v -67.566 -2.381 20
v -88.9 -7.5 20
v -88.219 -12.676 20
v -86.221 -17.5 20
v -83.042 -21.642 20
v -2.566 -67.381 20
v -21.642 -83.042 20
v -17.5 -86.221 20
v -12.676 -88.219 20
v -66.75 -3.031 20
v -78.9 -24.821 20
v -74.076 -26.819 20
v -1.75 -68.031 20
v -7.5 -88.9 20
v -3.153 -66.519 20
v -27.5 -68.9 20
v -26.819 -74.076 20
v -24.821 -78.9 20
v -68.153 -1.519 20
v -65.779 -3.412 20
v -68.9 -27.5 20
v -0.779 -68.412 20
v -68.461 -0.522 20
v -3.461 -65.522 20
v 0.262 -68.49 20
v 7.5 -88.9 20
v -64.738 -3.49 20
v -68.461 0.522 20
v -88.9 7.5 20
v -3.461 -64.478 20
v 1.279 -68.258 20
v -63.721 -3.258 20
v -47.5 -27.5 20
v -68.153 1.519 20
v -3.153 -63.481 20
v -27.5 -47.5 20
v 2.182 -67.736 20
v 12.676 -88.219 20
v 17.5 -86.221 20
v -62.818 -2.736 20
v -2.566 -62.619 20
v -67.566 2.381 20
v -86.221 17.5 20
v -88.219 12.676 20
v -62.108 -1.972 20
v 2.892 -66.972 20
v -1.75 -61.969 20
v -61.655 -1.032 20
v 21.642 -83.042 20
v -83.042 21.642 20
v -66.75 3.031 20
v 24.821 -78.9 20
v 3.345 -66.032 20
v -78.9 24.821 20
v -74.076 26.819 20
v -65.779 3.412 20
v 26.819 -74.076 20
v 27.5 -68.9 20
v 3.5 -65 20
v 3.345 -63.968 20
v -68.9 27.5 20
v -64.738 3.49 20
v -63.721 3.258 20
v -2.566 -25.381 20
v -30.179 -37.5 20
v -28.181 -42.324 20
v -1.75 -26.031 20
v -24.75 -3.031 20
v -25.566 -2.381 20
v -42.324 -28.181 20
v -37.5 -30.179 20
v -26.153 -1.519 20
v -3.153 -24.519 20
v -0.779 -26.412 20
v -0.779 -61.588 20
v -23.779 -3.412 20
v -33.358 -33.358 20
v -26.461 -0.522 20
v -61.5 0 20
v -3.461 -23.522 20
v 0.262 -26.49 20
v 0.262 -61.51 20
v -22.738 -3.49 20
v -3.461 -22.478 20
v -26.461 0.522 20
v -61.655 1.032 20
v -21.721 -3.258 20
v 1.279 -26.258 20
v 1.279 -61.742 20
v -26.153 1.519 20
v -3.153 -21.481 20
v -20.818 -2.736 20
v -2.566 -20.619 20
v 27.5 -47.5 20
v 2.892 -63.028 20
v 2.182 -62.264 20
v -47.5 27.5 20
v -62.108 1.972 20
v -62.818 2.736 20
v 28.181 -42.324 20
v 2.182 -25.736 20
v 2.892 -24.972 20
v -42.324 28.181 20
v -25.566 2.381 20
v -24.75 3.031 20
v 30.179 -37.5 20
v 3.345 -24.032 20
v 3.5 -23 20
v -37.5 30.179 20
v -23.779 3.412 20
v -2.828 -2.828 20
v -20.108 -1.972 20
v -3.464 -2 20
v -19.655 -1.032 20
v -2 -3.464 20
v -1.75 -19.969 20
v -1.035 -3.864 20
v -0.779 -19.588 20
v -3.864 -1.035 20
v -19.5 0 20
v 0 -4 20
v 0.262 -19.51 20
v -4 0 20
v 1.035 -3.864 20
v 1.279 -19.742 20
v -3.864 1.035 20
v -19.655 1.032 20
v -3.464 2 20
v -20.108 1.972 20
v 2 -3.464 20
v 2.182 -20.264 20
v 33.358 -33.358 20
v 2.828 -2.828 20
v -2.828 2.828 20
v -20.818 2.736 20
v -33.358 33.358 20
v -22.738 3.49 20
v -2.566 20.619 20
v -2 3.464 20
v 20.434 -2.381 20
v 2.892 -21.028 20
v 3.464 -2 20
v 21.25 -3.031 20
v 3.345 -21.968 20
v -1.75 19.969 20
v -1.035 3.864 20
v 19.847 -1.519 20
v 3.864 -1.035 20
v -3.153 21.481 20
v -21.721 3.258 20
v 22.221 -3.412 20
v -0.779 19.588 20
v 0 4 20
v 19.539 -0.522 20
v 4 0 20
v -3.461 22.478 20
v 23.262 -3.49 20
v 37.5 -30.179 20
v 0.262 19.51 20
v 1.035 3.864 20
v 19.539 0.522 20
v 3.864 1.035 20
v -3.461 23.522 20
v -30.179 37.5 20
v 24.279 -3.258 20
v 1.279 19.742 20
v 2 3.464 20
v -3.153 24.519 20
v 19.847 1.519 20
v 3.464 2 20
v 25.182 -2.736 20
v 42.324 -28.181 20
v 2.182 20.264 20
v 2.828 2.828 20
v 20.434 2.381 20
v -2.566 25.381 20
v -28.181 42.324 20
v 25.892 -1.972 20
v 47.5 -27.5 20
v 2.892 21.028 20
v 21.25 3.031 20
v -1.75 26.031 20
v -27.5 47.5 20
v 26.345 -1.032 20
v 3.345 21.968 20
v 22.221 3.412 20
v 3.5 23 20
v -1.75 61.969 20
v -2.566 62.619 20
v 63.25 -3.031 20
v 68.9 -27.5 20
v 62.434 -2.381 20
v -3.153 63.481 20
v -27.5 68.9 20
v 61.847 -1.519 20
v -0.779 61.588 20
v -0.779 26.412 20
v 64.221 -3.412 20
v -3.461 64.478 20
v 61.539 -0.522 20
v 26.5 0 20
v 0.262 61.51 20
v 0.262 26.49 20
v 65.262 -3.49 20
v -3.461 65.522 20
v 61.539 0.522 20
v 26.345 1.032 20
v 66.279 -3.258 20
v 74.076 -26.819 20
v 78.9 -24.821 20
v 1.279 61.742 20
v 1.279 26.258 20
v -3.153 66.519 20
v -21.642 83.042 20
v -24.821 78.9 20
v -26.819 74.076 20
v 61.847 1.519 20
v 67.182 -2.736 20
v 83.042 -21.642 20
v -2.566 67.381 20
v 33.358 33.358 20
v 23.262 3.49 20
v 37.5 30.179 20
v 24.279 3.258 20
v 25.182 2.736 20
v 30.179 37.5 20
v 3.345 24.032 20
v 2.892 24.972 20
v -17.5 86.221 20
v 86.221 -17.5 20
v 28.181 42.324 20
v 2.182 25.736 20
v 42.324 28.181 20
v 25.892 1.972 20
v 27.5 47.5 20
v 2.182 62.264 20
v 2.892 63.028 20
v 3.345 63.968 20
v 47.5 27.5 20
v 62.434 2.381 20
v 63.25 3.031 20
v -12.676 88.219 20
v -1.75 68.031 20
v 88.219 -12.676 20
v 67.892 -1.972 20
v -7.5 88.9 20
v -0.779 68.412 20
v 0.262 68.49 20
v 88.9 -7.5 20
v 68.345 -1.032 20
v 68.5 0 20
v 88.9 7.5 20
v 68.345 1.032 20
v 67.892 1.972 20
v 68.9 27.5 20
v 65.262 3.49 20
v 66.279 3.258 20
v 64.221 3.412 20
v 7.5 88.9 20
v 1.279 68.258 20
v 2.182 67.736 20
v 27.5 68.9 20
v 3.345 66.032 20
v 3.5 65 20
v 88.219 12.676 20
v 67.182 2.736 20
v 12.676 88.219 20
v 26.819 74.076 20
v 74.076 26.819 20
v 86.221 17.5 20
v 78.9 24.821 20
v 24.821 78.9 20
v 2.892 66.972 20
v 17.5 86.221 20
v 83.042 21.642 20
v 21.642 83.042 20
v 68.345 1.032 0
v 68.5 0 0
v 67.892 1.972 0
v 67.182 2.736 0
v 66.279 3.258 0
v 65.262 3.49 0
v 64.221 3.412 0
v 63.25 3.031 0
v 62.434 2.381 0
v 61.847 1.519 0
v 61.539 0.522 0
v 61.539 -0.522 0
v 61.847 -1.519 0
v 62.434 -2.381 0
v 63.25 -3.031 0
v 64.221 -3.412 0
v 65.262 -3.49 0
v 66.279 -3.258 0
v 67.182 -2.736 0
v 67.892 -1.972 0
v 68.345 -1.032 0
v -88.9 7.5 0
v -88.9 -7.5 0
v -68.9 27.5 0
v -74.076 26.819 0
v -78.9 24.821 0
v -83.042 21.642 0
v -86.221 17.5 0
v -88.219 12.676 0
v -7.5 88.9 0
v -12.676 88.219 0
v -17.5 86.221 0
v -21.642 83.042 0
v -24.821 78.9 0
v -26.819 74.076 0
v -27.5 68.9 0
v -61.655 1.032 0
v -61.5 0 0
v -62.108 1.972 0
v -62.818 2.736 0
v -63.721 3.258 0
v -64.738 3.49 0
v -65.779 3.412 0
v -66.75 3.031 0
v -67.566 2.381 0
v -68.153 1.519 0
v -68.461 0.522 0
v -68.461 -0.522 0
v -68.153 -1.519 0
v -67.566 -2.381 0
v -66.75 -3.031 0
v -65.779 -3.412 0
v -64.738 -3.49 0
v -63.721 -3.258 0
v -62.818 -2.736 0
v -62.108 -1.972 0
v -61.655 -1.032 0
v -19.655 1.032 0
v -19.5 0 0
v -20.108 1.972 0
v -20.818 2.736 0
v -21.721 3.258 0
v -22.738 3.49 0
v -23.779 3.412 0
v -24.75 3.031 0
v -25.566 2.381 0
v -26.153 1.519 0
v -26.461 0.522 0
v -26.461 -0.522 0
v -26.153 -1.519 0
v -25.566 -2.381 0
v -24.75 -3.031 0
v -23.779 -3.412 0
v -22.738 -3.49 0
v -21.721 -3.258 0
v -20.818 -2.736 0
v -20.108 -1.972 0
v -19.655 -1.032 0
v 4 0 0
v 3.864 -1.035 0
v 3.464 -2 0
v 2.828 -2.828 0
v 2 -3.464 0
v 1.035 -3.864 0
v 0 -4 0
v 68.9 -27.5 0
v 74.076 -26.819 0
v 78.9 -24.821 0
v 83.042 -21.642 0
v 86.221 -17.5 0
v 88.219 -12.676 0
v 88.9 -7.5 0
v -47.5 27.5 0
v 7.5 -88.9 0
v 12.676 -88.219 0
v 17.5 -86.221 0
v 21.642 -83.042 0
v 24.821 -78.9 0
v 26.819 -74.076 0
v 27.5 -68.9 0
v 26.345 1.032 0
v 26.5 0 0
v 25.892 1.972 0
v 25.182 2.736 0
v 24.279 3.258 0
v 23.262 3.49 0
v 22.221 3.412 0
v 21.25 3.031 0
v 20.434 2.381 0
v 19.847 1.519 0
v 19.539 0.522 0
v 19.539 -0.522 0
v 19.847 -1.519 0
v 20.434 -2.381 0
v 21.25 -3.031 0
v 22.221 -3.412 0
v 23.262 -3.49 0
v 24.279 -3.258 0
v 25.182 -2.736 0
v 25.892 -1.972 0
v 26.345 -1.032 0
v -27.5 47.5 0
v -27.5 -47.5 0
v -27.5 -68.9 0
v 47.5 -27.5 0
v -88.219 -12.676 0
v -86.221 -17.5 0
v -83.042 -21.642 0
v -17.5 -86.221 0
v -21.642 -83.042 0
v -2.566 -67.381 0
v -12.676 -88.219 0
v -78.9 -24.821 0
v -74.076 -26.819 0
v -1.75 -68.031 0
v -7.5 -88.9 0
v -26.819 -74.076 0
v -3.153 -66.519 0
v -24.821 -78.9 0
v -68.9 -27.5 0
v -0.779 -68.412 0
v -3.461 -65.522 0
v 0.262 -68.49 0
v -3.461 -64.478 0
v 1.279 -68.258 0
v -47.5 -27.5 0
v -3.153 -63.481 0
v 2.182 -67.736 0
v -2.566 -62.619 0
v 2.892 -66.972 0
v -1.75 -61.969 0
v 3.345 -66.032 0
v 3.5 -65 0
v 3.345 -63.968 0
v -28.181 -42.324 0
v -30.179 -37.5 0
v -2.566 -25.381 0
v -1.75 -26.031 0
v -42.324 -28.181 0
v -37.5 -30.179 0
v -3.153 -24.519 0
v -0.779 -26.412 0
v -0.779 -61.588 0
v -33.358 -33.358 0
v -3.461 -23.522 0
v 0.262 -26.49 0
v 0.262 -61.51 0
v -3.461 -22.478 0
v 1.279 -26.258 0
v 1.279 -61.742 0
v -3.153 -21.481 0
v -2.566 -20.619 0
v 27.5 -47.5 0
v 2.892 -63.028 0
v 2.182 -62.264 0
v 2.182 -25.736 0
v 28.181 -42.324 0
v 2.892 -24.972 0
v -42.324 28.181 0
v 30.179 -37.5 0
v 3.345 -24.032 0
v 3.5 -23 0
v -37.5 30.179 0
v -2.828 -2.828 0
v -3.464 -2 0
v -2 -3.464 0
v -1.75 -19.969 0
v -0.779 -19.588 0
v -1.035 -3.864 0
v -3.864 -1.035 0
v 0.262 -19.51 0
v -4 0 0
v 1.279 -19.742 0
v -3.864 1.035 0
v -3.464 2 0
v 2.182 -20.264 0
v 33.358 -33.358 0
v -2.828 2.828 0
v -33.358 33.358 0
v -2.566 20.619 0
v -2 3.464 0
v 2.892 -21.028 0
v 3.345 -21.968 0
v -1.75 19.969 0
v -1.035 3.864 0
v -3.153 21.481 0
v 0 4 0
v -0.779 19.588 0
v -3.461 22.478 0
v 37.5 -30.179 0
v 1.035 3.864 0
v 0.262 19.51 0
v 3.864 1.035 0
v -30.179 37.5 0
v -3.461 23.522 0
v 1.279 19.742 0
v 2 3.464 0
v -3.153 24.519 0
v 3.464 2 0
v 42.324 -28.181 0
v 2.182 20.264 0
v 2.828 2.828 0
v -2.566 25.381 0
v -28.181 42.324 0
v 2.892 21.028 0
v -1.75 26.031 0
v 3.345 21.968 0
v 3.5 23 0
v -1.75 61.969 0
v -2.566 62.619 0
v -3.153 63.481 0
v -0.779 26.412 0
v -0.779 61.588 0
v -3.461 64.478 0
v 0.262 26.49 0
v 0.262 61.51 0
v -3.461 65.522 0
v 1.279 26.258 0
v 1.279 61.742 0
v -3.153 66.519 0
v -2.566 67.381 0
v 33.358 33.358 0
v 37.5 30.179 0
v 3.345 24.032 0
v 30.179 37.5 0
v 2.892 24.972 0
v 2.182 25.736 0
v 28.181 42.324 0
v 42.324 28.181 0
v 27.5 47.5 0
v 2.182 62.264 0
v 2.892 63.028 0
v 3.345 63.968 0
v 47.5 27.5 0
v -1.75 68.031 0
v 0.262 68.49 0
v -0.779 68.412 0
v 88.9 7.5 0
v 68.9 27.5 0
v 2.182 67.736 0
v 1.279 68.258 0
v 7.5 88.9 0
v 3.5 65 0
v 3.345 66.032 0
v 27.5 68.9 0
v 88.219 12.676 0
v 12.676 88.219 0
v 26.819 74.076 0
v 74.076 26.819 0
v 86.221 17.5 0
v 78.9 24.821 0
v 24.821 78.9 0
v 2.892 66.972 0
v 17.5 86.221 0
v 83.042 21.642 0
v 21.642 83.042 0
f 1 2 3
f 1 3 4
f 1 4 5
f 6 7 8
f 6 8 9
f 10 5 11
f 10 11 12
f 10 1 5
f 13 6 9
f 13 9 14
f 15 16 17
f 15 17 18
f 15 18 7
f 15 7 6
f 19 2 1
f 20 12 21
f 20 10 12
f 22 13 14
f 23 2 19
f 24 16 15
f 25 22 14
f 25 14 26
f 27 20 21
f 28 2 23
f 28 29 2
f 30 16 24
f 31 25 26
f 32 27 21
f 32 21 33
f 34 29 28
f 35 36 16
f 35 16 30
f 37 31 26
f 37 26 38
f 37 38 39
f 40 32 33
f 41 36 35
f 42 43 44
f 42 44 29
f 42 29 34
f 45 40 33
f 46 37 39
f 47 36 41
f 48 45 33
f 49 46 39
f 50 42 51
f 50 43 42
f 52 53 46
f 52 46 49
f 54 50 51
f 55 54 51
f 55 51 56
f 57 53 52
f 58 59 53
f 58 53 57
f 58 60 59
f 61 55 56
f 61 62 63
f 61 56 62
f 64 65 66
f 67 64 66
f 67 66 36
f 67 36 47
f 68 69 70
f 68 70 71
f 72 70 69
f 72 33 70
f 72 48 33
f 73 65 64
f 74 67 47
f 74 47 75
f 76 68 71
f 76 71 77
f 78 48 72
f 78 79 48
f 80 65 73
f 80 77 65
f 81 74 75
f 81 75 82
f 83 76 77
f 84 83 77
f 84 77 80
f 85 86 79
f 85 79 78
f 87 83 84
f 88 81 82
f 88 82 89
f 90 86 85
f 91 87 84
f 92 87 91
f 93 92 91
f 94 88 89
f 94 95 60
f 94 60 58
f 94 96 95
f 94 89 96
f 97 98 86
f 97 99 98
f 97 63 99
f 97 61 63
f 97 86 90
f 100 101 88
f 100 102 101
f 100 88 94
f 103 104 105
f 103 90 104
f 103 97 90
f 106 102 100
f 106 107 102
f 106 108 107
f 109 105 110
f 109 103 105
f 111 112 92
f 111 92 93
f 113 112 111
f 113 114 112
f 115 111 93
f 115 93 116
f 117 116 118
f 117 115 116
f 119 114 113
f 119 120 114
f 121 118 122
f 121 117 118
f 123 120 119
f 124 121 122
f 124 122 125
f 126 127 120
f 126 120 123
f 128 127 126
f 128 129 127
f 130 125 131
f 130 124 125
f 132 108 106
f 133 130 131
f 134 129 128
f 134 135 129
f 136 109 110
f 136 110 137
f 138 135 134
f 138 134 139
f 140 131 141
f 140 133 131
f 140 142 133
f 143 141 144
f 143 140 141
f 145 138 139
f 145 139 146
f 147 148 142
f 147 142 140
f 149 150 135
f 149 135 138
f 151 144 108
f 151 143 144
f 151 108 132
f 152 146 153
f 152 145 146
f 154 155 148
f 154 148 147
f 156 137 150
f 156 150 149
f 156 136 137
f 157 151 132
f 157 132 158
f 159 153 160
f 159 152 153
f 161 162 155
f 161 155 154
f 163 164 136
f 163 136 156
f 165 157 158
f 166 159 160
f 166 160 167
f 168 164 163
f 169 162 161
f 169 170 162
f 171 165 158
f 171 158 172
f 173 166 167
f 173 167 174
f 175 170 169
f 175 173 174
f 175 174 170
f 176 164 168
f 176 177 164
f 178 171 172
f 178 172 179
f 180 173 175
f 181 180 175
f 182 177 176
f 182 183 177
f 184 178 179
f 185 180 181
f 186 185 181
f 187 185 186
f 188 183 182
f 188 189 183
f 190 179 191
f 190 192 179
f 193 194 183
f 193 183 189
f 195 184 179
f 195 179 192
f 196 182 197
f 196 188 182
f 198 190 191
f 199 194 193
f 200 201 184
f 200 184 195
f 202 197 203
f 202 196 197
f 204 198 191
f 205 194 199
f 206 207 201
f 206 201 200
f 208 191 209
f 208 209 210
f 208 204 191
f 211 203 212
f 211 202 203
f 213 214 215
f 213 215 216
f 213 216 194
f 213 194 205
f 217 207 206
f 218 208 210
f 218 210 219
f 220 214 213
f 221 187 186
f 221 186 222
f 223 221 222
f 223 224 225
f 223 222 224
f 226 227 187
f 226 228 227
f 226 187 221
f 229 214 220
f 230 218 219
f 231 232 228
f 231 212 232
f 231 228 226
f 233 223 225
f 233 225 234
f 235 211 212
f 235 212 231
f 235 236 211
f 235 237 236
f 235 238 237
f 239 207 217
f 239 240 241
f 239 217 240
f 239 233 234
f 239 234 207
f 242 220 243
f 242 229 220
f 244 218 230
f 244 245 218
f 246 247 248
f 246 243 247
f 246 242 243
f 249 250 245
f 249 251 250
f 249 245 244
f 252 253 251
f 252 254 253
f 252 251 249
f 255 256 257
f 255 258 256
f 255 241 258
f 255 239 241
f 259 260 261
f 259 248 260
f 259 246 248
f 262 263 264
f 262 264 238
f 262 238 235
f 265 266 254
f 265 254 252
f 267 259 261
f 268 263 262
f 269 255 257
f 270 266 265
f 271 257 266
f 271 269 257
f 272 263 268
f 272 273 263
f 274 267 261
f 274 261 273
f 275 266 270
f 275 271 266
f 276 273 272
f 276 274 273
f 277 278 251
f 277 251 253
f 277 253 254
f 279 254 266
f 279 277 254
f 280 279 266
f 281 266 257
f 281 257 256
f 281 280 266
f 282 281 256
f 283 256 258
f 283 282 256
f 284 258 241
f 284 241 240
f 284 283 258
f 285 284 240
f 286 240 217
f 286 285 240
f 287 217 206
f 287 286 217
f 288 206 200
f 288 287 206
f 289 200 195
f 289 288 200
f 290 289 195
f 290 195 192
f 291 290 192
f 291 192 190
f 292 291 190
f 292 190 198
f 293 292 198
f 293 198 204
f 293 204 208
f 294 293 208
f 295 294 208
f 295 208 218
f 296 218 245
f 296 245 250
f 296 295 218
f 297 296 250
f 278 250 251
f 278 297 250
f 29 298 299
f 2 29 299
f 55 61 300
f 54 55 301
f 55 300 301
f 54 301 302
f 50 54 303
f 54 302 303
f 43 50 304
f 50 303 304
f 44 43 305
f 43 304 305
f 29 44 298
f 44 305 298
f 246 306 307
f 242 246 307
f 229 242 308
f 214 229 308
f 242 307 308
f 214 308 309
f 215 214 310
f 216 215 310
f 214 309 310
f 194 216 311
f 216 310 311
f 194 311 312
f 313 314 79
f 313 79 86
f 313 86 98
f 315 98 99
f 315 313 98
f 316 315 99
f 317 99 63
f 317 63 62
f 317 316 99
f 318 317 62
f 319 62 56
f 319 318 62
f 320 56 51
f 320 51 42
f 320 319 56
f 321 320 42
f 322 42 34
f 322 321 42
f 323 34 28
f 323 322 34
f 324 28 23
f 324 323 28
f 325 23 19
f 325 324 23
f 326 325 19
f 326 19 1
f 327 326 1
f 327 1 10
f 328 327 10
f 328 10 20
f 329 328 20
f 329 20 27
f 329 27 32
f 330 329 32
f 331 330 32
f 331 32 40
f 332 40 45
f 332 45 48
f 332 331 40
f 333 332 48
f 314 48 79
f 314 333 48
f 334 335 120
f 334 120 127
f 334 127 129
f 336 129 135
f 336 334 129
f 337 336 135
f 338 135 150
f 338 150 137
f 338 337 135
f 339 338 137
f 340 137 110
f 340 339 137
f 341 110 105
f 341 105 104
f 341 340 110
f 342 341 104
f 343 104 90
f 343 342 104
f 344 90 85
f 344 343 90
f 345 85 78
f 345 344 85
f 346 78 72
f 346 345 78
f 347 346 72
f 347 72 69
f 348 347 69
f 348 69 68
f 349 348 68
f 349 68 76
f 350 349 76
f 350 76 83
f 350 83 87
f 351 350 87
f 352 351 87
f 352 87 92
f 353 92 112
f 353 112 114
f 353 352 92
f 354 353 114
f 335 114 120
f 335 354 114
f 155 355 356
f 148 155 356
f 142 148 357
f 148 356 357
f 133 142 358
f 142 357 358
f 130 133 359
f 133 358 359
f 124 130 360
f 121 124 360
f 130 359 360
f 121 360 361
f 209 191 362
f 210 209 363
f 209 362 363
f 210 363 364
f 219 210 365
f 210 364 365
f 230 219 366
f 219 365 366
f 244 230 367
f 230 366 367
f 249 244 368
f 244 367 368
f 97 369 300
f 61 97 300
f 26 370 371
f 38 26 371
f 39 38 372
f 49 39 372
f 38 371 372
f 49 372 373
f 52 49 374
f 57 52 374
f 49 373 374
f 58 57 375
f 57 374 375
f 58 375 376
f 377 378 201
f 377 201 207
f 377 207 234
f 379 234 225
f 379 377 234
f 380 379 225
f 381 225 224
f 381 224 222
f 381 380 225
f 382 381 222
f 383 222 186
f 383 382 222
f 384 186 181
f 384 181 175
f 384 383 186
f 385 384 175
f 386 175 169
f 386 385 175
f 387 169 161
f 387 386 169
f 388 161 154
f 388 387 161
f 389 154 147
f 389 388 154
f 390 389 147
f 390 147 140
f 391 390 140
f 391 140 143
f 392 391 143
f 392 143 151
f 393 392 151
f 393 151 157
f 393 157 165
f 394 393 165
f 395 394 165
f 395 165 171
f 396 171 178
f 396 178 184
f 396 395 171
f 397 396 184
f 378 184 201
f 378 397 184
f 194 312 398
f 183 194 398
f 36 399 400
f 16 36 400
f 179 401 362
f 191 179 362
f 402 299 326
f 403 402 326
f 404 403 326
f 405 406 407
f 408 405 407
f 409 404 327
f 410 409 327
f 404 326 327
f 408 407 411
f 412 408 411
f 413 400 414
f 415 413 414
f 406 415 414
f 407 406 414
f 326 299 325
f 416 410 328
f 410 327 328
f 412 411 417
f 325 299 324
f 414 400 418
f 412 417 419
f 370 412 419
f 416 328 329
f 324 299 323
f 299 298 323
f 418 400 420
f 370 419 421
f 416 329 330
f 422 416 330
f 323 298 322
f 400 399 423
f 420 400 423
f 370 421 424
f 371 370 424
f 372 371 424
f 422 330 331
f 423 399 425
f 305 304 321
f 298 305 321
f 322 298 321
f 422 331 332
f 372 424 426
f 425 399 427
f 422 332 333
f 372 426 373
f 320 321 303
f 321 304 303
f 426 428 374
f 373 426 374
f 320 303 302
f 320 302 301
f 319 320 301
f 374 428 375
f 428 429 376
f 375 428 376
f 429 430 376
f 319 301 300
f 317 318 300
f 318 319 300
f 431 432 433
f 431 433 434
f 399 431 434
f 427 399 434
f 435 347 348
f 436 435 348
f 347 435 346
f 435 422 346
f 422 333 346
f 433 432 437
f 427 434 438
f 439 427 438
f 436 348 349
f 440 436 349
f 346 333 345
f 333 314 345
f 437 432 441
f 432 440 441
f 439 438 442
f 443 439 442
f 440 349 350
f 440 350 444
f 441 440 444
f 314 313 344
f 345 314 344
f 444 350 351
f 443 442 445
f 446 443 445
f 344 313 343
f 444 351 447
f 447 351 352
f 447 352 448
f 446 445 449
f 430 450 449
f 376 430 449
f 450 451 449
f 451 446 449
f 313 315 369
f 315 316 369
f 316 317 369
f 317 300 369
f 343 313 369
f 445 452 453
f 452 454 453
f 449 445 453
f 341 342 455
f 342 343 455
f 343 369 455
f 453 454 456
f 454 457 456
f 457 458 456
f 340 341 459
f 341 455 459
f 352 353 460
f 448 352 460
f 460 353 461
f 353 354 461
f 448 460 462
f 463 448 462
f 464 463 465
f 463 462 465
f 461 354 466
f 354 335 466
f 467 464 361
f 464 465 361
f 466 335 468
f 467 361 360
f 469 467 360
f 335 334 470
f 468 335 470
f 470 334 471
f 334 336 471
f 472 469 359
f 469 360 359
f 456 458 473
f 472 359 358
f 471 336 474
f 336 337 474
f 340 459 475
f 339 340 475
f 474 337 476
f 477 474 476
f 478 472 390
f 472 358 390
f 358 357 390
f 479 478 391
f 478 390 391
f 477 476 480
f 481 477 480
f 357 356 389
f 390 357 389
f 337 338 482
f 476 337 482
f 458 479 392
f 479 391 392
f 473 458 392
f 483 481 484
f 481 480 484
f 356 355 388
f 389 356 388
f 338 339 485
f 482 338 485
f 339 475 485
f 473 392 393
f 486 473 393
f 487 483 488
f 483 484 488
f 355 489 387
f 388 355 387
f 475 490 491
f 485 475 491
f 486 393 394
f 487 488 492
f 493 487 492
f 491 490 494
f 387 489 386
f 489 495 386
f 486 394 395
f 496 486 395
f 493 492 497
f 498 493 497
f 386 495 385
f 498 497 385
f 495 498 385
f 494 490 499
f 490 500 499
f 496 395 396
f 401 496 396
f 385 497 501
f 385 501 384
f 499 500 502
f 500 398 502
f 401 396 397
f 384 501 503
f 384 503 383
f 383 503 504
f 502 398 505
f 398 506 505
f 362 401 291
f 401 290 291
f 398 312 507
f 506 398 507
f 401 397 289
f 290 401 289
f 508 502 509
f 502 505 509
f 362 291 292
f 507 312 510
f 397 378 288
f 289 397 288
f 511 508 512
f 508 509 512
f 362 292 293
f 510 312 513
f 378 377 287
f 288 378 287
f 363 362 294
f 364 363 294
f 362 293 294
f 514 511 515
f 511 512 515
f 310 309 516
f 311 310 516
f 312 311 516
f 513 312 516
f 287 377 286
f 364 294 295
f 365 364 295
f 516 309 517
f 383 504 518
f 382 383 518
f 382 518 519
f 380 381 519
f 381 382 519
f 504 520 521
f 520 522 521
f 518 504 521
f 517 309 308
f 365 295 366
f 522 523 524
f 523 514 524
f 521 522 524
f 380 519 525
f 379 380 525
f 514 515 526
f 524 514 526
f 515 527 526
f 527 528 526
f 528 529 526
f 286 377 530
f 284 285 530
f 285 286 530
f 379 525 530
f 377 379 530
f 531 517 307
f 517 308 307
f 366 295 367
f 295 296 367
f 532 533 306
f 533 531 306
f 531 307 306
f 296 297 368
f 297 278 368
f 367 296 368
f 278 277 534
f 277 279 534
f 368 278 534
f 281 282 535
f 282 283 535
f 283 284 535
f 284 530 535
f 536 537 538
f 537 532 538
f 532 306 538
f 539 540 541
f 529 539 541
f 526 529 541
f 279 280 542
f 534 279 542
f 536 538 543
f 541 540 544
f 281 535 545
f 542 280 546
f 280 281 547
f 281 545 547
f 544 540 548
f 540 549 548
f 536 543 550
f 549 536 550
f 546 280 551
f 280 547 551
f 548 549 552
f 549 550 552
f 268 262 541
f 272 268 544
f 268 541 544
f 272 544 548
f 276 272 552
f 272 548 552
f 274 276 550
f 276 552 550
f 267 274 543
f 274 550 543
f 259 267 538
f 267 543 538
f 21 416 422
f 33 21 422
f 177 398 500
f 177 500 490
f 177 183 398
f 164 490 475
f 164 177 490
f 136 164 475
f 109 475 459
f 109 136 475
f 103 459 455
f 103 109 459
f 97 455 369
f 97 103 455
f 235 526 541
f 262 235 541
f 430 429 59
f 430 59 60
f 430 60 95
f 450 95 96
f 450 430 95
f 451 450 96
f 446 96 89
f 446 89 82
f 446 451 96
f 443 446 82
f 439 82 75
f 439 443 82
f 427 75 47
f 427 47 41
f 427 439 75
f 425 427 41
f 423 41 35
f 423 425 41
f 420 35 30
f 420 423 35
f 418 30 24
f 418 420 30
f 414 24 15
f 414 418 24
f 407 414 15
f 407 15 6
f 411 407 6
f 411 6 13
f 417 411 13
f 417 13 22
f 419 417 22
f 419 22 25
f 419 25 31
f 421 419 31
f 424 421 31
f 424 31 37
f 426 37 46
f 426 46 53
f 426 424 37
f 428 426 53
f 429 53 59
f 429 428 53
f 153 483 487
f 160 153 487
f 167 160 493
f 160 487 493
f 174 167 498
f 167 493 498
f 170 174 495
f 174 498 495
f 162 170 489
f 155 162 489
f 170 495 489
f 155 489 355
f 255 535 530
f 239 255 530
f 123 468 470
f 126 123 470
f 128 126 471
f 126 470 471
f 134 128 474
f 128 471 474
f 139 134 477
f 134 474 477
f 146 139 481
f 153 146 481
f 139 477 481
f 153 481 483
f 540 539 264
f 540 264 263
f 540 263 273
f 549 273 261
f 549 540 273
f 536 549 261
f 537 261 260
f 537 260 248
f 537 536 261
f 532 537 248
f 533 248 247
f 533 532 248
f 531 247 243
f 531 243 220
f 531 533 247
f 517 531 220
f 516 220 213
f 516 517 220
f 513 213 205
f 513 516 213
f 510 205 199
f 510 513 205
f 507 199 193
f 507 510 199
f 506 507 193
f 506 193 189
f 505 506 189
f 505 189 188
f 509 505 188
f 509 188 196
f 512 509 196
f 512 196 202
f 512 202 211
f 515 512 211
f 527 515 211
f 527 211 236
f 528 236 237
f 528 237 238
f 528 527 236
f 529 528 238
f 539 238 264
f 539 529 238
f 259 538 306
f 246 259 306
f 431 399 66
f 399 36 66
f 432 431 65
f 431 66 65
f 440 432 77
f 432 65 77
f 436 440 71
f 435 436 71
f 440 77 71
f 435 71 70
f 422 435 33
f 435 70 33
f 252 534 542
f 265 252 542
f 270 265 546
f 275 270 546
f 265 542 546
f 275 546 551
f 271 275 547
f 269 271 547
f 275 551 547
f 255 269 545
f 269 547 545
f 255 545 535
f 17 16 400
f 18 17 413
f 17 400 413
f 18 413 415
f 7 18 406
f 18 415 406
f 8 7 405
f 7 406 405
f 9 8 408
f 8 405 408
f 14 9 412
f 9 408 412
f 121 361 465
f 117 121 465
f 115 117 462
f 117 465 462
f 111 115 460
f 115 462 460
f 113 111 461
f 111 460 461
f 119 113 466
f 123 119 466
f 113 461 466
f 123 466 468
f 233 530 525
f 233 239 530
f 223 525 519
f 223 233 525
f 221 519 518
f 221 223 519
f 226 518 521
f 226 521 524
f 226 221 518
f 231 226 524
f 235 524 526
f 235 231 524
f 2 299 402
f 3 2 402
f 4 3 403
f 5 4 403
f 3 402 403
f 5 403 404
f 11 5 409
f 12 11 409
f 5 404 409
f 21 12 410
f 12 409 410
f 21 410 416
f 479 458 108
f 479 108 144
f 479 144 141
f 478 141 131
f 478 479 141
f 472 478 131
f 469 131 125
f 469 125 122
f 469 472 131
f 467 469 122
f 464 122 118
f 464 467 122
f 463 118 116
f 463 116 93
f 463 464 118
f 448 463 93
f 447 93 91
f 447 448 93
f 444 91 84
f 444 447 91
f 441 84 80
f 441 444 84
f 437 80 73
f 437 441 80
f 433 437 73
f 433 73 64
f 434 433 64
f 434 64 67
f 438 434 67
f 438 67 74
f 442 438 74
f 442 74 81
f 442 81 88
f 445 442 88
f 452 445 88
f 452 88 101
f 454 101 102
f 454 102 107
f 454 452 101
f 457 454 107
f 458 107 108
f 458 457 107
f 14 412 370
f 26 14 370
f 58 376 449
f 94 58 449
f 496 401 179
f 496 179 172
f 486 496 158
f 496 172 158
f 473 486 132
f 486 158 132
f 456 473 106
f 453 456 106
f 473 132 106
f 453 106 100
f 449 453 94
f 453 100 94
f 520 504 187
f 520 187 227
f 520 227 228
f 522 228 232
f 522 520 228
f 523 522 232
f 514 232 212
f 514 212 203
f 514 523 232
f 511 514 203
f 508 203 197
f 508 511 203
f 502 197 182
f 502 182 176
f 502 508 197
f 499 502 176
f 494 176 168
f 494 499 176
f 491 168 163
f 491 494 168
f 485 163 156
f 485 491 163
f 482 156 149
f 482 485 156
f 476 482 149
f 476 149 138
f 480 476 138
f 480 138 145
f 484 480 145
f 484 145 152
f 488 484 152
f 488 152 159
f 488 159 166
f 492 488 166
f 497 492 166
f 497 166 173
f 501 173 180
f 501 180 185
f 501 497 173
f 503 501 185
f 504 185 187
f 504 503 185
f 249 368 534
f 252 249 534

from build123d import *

# Parameters (mm, degrees)
F0_R     = 3.5
F1_DEPTH = 20
F2_R     = 20


with BuildPart() as f1:
    # F0 (on Top) → F1 (new body)
    with BuildSketch(Plane.XY):
        with BuildLine():
            Line((68.9, 27.5), (27.5, 27.5))
            Line((27.5, 27.5), (27.5, 68.9))
            ThreePointArc((27.5, 68.9), (21.642136, 83.042136), (7.5, 88.9))
            Line((7.5, 88.9), (-7.5, 88.9))
            ThreePointArc((-7.5, 88.9), (-21.642136, 83.042136), (-27.5, 68.9))
            Line((-27.5, 68.9), (-27.5, 27.5))
            Line((-27.5, 27.5), (-68.9, 27.5))
            ThreePointArc((-68.9, 27.5), (-83.042136, 21.642136), (-88.9, 7.5))
            Line((-88.9, 7.5), (-88.9, -7.5))
            ThreePointArc((-88.9, -7.5), (-83.042136, -21.642136), (-68.9, -27.5))
            Line((-68.9, -27.5), (-27.5, -27.5))
            Line((-27.5, -27.5), (-27.5, -68.9))
            ThreePointArc((-27.5, -68.9), (-21.642136, -83.042136), (-7.5, -88.9))
            Line((-7.5, -88.9), (7.5, -88.9))
            ThreePointArc((7.5, -88.9), (21.642136, -83.042136), (27.5, -68.9))
            Line((27.5, -68.9), (27.5, -27.5))
            Line((27.5, -27.5), (68.9, -27.5))
            ThreePointArc((68.9, -27.5), (83.042136, -21.642136), (88.9, -7.5))
            Line((88.9, -7.5), (88.9, 7.5))
            ThreePointArc((88.9, 7.5), (83.042136, 21.642136), (68.9, 27.5))
        make_face()
        with Locations((0, -65)):
            Circle(F0_R, mode=Mode.SUBTRACT)
        with Locations((0, -23)):
            Circle(F0_R, mode=Mode.SUBTRACT)
        with Locations((-65, 0)):
            Circle(F0_R, mode=Mode.SUBTRACT)
        with Locations((-23, 0)):
            Circle(F0_R, mode=Mode.SUBTRACT)
        with BuildLine():
            ThreePointArc((4, 0), (2.828427, -2.828427), (0, -4))
            ThreePointArc((0, -4), (-2.828427, -2.828427), (-4, 0))
            ThreePointArc((-4, 0), (-2.828427, 2.828427), (0, 4))
            ThreePointArc((0, 4), (2.828427, 2.828427), (4, 0))
        make_face(mode=Mode.SUBTRACT)
        with Locations((23, 0)):
            Circle(F0_R, mode=Mode.SUBTRACT)
        with Locations((0, 23)):
            Circle(F0_R, mode=Mode.SUBTRACT)
        with Locations((65, 0)):
            Circle(F0_R, mode=Mode.SUBTRACT)
        with Locations((0, 65)):
            Circle(F0_R, mode=Mode.SUBTRACT)
    extrude(amount=F1_DEPTH)

    # F2
    f2_edges = [f1.edges().sort_by_distance(p)[0] for p in [
        (27.5, 27.5, 10),
        (27.5, -27.5, 10),
        (-27.5, -27.5, 10),
        (-27.5, 27.5, 10),
    ]]
    fillet(f2_edges, radius=F2_R)


solid = f1.part
